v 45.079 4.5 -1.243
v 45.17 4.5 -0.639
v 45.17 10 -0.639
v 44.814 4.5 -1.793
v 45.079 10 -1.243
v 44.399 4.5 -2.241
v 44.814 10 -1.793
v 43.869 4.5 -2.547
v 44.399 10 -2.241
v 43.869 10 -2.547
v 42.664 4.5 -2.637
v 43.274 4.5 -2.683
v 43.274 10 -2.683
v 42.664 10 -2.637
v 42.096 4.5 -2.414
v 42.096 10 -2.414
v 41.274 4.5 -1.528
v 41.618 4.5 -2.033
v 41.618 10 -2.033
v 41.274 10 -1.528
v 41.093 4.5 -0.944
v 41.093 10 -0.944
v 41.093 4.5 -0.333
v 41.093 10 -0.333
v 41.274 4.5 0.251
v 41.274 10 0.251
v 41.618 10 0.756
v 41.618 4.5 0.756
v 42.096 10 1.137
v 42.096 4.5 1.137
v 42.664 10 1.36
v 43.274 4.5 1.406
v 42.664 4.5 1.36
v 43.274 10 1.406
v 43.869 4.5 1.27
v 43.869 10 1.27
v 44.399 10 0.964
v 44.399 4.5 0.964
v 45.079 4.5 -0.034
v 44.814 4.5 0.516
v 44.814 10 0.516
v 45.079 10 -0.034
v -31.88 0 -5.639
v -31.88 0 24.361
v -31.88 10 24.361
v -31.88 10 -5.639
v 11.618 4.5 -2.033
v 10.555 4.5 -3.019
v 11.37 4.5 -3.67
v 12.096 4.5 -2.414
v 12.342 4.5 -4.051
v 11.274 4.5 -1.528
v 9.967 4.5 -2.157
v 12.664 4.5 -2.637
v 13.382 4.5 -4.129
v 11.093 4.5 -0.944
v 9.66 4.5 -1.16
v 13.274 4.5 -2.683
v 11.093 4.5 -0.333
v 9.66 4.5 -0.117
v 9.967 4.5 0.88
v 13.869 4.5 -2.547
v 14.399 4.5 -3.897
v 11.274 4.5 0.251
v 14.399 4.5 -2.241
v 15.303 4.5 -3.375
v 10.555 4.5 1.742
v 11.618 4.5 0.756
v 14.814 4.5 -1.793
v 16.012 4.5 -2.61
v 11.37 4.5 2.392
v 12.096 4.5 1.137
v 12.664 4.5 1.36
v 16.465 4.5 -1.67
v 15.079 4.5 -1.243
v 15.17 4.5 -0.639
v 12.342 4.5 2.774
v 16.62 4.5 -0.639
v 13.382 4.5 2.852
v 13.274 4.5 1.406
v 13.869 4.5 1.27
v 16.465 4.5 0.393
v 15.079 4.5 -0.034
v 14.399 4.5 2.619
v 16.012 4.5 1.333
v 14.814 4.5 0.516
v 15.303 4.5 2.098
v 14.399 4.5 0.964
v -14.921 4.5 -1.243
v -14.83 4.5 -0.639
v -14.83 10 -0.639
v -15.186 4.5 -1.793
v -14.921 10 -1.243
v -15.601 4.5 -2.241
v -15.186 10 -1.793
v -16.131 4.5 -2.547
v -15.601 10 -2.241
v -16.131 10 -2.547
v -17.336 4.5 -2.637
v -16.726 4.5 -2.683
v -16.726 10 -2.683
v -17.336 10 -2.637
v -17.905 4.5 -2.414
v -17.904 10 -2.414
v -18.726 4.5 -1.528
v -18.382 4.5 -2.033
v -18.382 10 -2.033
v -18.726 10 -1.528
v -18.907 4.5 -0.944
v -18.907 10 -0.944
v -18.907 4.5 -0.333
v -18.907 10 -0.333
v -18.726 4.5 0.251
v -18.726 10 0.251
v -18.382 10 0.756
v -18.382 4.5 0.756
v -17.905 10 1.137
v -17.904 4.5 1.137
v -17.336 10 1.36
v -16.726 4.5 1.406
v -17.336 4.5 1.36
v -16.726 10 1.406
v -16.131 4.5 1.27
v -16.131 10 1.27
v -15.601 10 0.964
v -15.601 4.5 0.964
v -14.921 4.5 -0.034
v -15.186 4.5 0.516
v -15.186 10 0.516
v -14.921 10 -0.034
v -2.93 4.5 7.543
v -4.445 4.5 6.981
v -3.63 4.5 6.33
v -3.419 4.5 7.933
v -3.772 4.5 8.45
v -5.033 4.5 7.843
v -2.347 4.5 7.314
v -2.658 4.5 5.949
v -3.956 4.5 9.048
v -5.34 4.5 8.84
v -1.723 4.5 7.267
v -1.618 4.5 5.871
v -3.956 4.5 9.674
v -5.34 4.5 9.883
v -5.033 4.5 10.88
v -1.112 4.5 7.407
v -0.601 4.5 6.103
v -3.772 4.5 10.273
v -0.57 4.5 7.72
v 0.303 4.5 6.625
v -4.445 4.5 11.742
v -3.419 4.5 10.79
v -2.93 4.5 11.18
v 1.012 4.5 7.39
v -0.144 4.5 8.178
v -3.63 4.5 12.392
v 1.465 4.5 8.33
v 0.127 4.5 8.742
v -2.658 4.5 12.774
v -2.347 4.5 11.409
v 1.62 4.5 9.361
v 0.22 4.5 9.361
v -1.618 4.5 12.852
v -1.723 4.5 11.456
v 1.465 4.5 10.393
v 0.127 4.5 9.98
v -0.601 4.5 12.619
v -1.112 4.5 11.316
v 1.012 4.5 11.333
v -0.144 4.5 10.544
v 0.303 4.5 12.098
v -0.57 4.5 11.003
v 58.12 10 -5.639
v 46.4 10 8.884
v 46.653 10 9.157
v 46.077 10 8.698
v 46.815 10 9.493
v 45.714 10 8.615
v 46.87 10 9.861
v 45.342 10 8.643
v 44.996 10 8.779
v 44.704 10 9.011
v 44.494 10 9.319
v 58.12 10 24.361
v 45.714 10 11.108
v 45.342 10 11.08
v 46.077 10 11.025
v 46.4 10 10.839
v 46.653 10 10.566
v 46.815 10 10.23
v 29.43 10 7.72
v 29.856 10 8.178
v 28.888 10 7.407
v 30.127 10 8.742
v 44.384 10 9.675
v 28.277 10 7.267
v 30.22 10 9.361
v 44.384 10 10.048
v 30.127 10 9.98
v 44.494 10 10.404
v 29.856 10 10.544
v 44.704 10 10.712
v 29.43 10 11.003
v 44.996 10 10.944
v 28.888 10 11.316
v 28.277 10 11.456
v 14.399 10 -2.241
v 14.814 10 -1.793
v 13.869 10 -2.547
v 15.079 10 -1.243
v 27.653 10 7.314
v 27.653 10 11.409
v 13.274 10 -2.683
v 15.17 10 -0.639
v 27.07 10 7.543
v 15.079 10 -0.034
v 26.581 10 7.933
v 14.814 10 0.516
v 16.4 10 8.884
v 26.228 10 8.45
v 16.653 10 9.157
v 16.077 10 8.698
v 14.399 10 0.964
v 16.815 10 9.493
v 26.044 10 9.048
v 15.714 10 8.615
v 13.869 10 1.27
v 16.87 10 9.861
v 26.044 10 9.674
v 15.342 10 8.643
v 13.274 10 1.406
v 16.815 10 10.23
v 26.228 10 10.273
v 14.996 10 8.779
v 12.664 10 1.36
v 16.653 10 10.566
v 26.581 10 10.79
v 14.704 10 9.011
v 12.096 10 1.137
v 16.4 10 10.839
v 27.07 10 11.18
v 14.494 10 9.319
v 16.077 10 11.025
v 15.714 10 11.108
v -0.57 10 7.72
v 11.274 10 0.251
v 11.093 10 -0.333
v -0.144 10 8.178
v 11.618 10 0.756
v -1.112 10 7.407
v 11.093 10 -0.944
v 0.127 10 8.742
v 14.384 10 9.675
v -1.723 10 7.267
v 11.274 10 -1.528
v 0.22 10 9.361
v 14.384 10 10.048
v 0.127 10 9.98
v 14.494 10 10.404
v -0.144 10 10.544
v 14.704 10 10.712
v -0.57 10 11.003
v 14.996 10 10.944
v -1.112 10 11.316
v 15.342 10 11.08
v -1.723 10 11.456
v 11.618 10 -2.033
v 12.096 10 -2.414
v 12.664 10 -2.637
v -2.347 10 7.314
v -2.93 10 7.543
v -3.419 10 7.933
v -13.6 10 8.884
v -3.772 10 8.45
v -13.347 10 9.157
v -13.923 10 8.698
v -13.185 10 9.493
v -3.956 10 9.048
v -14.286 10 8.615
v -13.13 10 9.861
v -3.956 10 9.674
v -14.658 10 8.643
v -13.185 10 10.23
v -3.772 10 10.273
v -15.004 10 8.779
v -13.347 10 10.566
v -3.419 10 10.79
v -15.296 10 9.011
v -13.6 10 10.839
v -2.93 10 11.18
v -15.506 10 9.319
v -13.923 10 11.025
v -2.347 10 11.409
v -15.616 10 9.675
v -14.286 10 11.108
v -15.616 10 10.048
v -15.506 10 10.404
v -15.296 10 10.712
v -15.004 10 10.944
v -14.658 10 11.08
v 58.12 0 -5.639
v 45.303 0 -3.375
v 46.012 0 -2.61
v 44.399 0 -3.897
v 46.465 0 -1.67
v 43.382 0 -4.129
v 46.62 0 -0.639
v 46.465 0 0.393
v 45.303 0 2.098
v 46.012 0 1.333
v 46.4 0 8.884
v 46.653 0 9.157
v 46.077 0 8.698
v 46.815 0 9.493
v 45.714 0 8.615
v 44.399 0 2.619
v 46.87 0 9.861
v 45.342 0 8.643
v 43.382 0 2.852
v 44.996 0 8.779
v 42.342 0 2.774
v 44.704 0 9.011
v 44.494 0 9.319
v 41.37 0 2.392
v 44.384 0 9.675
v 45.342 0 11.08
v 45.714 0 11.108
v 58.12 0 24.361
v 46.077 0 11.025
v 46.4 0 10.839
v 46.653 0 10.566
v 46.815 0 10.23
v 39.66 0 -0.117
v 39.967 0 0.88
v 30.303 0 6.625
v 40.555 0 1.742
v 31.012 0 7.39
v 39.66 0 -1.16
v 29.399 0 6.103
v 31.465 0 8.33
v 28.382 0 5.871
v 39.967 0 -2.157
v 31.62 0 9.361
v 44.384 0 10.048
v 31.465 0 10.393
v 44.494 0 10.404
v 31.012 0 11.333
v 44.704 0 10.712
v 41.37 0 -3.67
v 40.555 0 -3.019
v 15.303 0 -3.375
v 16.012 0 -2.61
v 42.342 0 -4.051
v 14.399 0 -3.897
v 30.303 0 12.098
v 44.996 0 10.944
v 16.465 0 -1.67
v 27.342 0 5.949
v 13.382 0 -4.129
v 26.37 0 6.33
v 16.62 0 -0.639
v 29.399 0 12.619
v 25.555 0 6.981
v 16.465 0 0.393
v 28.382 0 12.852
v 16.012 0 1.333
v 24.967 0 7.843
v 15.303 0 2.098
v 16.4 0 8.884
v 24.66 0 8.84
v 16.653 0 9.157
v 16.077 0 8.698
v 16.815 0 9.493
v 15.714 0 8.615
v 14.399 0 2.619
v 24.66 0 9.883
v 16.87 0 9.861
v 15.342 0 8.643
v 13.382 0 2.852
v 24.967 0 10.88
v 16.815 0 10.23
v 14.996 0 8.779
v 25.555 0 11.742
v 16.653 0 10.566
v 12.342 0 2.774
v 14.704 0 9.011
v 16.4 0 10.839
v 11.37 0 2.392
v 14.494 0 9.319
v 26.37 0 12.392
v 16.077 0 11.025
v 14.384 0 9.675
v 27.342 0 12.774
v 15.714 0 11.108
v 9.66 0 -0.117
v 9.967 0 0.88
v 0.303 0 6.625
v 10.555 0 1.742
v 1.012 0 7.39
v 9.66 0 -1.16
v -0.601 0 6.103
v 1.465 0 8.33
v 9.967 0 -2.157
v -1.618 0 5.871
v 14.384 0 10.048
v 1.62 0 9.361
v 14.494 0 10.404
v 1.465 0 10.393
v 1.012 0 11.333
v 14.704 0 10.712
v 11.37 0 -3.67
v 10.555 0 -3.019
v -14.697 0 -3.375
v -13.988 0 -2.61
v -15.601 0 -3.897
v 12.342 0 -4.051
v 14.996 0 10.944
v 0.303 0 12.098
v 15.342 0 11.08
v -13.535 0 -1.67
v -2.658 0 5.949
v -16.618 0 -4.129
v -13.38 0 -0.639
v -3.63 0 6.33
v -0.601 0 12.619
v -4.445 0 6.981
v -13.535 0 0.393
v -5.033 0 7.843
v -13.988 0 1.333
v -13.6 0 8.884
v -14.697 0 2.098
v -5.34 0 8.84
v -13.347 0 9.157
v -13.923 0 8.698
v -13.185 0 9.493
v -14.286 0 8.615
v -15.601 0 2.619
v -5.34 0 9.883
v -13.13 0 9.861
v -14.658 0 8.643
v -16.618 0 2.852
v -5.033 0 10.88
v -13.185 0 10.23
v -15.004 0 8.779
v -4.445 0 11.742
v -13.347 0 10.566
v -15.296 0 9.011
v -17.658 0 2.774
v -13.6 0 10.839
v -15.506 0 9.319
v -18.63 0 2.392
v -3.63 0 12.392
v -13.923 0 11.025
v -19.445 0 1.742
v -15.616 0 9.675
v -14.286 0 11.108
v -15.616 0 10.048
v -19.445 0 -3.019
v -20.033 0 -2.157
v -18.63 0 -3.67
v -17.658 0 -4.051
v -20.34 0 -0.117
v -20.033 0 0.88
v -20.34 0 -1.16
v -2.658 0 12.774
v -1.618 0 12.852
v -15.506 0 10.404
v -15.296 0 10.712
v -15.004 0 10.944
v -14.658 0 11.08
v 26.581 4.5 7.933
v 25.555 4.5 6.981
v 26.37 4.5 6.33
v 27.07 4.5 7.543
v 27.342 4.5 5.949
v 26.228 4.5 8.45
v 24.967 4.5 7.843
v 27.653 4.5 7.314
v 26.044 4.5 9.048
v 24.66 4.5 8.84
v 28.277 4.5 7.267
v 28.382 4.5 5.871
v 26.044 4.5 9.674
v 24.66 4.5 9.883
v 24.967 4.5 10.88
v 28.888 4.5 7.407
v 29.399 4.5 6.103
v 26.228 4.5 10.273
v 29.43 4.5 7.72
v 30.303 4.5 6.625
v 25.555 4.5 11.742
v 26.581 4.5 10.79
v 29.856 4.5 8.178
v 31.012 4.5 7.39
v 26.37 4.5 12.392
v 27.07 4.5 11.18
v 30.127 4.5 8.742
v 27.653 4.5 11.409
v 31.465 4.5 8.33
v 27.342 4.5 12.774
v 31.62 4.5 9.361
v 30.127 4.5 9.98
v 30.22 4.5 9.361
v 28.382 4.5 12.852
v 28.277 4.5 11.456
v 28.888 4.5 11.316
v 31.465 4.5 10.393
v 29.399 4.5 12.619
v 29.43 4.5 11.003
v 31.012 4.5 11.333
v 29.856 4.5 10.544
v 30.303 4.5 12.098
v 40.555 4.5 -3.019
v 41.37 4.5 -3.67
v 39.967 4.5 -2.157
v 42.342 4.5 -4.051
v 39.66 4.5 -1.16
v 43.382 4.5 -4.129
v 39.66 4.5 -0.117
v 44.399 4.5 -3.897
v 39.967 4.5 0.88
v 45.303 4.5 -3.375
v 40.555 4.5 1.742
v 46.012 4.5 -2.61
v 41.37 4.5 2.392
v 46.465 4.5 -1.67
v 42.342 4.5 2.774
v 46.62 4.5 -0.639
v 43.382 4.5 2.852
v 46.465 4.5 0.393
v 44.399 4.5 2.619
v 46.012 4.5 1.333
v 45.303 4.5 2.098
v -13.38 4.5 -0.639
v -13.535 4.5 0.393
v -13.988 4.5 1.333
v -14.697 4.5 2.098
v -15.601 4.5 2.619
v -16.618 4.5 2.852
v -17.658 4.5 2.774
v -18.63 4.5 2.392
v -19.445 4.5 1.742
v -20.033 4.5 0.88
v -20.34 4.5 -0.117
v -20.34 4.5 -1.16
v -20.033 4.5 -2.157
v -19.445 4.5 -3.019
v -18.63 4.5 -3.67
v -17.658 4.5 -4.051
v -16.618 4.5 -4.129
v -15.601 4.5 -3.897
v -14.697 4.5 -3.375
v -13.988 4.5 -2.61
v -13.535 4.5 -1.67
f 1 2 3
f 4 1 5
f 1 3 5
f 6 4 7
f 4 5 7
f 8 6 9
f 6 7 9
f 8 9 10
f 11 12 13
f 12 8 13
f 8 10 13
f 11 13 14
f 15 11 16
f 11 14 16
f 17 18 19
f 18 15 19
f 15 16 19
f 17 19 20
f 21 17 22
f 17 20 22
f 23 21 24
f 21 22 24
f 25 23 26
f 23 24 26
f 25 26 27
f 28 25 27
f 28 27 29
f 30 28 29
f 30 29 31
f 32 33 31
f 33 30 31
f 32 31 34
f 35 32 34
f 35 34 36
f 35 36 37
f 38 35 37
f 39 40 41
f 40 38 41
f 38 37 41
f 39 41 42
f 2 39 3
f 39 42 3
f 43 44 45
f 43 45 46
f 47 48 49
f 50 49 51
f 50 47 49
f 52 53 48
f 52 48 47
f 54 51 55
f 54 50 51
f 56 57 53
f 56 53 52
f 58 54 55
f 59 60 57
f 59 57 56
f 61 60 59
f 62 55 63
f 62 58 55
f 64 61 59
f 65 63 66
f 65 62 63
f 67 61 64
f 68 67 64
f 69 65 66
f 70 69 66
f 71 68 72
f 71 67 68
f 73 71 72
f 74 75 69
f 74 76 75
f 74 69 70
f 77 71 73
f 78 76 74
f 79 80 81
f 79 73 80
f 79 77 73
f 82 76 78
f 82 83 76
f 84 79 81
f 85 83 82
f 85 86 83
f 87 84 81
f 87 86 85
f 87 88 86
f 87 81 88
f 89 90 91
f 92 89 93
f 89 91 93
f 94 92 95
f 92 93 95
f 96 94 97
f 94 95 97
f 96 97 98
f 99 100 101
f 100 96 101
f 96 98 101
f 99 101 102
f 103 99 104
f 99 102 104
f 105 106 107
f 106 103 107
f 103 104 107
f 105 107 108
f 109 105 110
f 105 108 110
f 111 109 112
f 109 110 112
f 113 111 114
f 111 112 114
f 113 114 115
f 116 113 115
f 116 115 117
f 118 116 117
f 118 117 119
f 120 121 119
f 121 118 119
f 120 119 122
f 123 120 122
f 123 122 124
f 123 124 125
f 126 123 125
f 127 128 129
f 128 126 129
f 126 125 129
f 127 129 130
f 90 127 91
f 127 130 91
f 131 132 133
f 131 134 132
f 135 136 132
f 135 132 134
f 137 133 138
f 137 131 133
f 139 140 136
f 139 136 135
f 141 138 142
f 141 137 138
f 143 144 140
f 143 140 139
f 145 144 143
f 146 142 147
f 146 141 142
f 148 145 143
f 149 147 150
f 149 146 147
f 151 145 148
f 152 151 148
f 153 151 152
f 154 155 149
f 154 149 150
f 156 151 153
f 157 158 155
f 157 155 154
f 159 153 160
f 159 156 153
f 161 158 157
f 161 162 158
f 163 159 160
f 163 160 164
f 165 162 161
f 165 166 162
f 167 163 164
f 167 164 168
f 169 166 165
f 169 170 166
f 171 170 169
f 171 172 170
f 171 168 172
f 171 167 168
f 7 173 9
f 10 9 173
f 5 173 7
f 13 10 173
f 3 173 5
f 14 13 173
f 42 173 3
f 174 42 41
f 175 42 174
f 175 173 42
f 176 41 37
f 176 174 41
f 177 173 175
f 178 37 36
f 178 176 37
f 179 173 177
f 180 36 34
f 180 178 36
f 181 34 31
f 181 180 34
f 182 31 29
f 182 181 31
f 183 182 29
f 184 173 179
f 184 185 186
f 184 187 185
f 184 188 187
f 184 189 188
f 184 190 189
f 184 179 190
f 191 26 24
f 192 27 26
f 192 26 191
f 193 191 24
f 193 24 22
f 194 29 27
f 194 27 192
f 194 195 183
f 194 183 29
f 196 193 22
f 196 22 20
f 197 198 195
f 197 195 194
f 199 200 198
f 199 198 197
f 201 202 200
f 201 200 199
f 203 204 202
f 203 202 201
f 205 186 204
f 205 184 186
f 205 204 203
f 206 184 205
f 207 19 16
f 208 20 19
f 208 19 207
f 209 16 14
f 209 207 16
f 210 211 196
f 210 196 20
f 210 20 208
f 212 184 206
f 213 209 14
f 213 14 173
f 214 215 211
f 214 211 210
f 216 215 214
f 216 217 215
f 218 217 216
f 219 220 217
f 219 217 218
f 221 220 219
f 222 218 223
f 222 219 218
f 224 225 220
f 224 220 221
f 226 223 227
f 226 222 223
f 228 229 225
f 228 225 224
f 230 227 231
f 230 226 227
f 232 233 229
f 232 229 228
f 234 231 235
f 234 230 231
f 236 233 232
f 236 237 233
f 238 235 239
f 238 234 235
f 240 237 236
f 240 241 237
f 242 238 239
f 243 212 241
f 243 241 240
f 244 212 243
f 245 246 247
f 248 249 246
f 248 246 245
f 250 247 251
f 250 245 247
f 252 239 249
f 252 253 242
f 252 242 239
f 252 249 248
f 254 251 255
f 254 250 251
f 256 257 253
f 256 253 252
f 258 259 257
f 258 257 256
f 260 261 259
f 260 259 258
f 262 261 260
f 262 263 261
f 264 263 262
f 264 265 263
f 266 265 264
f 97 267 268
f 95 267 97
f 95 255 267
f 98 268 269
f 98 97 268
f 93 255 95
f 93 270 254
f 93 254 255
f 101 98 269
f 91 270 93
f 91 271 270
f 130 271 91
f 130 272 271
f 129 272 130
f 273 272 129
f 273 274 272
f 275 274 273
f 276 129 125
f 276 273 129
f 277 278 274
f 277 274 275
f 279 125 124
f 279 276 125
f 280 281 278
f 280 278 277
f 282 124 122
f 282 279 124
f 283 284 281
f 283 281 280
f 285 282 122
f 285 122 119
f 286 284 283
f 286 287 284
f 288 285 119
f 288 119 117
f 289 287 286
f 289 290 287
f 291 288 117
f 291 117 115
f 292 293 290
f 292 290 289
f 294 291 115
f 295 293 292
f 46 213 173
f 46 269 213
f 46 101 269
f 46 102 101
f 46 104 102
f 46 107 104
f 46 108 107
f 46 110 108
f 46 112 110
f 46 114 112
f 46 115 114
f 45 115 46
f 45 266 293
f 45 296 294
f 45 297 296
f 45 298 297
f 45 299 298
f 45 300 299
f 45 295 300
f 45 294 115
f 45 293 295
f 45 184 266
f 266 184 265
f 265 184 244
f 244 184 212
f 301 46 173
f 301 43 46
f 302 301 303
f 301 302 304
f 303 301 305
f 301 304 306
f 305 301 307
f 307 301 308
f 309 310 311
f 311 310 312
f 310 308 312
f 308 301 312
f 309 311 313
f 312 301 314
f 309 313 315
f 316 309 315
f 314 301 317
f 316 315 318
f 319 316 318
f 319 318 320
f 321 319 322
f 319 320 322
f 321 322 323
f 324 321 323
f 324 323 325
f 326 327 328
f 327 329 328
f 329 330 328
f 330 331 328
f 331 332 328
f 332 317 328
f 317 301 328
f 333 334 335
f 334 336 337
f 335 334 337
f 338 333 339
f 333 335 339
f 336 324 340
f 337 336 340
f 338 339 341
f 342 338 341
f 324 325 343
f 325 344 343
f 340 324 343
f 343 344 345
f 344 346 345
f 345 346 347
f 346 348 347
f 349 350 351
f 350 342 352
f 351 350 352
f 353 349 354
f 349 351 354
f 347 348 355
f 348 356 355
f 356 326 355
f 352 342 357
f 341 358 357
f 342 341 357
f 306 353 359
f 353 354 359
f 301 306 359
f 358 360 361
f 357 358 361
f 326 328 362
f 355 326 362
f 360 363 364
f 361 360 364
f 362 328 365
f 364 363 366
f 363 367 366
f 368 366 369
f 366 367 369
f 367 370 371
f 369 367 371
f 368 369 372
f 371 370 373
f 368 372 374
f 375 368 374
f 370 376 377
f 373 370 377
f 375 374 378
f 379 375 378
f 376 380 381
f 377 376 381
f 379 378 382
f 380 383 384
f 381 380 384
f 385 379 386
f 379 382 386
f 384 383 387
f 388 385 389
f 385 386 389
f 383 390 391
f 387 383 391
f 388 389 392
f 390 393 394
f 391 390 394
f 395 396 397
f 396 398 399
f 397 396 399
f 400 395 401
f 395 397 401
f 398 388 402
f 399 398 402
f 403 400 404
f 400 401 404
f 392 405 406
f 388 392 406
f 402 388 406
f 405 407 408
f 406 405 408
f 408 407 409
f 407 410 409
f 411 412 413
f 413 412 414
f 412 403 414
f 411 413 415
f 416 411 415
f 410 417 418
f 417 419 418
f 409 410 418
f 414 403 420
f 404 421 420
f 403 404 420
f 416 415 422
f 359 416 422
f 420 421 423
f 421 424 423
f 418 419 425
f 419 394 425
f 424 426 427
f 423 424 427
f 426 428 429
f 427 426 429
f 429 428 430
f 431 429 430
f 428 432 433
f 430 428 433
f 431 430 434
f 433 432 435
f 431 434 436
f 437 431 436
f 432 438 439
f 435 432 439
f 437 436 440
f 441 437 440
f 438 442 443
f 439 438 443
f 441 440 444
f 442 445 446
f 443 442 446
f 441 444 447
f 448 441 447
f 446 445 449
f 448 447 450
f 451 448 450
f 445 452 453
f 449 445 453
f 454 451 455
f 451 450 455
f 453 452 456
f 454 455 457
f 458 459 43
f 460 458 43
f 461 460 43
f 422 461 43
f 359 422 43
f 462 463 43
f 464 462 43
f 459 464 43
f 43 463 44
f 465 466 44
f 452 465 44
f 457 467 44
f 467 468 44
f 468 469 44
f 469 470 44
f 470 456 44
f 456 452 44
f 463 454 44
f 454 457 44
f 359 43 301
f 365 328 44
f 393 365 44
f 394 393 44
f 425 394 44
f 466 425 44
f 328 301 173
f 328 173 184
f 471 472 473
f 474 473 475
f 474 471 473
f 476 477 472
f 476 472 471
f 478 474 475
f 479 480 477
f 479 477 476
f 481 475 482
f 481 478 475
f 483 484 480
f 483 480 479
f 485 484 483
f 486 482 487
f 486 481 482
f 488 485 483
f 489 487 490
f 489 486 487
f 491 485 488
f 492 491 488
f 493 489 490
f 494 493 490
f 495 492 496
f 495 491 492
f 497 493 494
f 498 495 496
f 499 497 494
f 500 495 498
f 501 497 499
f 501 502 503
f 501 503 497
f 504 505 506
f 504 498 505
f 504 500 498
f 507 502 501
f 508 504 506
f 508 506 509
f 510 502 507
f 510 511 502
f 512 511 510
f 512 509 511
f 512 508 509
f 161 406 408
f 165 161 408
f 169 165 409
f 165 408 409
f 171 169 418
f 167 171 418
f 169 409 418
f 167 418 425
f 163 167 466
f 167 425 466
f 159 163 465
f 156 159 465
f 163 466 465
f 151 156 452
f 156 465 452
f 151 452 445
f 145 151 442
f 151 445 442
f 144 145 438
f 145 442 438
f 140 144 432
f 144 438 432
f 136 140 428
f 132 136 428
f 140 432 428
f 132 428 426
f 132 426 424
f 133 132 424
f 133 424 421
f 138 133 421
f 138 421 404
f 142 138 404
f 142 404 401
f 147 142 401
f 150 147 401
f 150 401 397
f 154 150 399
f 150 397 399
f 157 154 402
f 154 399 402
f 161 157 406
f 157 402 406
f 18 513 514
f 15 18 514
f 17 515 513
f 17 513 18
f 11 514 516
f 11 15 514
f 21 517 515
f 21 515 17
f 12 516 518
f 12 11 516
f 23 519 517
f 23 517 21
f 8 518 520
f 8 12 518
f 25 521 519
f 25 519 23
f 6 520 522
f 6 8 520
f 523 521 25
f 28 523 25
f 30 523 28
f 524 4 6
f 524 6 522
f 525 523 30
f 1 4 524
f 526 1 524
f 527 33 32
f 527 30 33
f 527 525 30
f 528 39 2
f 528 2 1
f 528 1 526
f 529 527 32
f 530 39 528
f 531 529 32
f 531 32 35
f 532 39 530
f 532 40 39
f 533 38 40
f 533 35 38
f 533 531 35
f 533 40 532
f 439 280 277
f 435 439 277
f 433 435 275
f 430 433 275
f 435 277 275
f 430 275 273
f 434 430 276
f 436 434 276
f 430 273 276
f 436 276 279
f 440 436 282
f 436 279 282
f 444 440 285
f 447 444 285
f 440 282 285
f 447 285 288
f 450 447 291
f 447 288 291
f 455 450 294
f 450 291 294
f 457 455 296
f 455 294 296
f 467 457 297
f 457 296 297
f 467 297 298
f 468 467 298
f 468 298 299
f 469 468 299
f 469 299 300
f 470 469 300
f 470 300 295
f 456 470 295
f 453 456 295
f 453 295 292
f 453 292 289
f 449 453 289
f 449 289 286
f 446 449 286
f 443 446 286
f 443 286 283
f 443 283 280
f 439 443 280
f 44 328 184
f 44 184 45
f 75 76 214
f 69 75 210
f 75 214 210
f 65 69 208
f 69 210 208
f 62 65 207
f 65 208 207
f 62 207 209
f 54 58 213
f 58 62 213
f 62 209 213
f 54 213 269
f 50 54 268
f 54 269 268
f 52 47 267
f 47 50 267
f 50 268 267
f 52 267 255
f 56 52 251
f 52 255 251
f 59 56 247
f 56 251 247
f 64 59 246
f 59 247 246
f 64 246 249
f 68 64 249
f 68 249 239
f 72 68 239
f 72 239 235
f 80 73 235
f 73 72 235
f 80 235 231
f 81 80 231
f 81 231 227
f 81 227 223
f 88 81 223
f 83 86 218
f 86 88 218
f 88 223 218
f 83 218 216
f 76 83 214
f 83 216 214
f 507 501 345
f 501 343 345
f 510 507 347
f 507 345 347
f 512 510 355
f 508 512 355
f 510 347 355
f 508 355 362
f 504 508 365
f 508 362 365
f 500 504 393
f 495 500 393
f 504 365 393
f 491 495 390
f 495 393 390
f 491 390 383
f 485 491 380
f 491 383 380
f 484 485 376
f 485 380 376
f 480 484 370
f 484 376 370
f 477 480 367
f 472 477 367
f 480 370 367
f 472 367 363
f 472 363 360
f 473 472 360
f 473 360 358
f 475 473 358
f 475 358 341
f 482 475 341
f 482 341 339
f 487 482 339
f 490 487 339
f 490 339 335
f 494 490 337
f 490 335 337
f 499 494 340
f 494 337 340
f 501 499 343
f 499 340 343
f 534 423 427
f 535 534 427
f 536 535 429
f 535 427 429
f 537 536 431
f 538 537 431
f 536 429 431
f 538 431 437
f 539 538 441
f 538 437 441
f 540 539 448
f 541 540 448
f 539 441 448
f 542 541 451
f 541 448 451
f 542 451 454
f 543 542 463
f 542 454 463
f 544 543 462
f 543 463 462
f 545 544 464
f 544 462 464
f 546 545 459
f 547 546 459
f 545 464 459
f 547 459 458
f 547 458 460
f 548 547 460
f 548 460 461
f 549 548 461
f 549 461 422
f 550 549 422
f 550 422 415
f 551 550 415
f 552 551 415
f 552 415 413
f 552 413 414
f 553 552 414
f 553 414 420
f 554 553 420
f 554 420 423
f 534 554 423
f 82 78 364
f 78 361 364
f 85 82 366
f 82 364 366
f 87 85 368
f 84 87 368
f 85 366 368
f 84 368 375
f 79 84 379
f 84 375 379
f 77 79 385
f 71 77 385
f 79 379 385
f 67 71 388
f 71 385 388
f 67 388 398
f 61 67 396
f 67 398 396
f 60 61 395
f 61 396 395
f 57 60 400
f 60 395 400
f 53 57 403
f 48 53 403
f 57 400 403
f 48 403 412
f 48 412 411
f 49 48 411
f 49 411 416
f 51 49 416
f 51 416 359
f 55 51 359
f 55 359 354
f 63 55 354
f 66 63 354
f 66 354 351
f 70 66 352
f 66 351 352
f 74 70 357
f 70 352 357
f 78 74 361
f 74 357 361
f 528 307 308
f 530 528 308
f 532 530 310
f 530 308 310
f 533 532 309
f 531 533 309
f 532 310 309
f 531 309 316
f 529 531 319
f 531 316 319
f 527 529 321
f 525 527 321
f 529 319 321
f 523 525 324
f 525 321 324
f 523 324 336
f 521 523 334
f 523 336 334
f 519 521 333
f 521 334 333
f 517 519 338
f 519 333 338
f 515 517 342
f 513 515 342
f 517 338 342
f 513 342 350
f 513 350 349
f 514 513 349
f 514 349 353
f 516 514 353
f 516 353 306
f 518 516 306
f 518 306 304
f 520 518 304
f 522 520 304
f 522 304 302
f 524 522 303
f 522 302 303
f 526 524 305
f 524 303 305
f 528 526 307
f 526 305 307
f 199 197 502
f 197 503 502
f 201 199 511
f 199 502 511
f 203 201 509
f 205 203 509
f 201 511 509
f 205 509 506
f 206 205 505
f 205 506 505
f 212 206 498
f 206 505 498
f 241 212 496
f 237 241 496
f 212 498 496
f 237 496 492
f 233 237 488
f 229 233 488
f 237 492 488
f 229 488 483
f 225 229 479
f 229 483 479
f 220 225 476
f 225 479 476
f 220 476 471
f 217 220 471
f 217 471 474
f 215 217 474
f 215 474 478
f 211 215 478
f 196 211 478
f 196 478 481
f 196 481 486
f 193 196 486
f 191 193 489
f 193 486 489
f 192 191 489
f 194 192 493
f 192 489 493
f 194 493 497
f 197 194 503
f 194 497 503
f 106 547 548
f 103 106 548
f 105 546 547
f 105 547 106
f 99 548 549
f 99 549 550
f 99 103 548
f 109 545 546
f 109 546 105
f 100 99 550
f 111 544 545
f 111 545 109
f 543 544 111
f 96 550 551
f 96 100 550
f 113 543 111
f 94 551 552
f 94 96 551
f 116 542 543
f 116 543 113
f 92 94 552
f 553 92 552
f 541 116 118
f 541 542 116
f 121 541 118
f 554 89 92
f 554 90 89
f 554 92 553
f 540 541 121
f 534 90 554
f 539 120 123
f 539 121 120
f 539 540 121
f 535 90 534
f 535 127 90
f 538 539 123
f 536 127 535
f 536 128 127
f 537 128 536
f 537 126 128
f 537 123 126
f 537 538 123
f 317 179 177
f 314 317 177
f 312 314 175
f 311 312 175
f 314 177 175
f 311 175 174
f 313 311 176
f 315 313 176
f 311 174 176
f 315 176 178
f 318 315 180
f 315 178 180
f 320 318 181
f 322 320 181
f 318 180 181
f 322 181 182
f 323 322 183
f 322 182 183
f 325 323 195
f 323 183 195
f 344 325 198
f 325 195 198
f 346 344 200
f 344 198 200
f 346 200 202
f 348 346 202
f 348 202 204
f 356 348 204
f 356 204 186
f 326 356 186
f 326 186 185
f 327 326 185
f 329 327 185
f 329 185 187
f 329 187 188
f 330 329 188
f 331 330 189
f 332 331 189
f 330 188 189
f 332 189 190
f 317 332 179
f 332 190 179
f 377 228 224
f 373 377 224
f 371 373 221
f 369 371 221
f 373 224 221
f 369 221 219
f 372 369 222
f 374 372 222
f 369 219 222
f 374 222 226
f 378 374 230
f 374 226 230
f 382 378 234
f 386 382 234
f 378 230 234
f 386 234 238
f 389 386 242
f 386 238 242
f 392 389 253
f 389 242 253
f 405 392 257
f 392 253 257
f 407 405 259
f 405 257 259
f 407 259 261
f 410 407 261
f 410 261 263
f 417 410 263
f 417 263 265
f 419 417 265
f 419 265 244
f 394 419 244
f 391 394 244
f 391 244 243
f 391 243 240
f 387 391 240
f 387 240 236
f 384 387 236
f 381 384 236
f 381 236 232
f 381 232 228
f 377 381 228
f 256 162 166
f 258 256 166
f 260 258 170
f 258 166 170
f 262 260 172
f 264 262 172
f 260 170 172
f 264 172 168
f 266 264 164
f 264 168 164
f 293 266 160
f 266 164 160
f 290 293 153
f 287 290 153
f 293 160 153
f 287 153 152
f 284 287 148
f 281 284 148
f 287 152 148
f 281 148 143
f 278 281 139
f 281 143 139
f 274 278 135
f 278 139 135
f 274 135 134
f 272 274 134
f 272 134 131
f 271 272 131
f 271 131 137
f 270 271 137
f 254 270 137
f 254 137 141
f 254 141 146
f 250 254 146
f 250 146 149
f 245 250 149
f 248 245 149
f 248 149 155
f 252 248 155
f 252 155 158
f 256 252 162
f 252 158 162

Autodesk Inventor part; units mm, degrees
ref_plane "YZ Plane" through (0, 0, 0) normal (1, 0, 0) x (0, 1, 0)
ref_plane "XZ Plane" through (0, 0, 0) normal (0, 1, 0) x (-1, 0, 0)
ref_plane "XY Plane" through (0, 0, 0) normal (0, 0, 1) x (1, 0, 0)
sketch "Sketch1" plane through (0, 0, 0) normal (0, 1, 0) x (-1, 0, 0)
  line L0 (31.8795, -5.6386) -> (-58.1205, -5.6386)
  line L1 (-58.1205, -5.6386) -> (-58.1205, 24.3614)
  line L2 (-58.1205, 24.3614) -> (31.8795, 24.3614)
  line L3 (31.8795, 24.3614) -> (31.8795, -5.6386)
  point P0 (0, 0)
  dimension "d0" = 90
  dimension "d5" = 30
extrude "Extrusion1" add sketch "Sketch1" along normal blind 10
sketch "Sketch2" plane through (0, 10, 0) normal (0, 1, 0) x (1, 0, 0)
  line L0 (58.1205, 5.6386) -> (-31.8795, 5.6386) projected
  line L1 (-31.8795, 5.6386) -> (-31.8795, -24.3614) projected
  circle A0 centre (-16.8795, 0.6386) radius 2.05
  circle A1 centre (13.1205, 0.6386) radius 2.05
  circle A2 centre (43.1205, 0.6386) radius 2.05
  point P0 (0, 0)
  dimension "d8" = 4.1
  dimension "d10" = 4.1
  dimension "d11" = 4.1
  dimension "d12" = 5
  dimension "d13" = 5
  dimension "d14" = 5
  dimension "d15" = 15
  dimension "d16" = 30
  dimension "d17" = 30
extrude "Extrusion2" cut sketch "Sketch2" against normal blind 10
sketch "Sketch4" plane through (0, 0, 0) normal (0, -1, 0) x (1, 0, 0)
  circle A0 centre (13.1205, -0.6386) radius 2.05 projected
  circle A1 centre (-16.8795, -0.6386) radius 2.05 projected
  circle A2 centre (43.1205, -0.6386) radius 2.05 projected
  circle A3 centre (-16.8795, -0.6386) radius 3.5
  circle A4 centre (13.1205, -0.6386) radius 3.5
  circle A5 centre (43.1205, -0.6386) radius 3.5
  point P0 (0, 0)
  dimension "d26" = 7
  dimension "d28" = 7
  dimension "d29" = 7
extrude "Extrusion4" cut sketch "Sketch4" against normal blind 4.5
sketch "Sketch5" plane through (0, 0, 0) normal (0, -1, 0) x (1, 0, 0)
  line L0 (58.1205, -5.6386) -> (58.1205, 24.3614) projected
  line L1 (58.1205, 24.3614) -> (-31.8795, 24.3614) projected
  line L2 (-31.8795, 24.3614) -> (-31.8795, -5.6386) projected
  circle A0 centre (-1.8795, 9.3614) radius 2.1
  circle A1 centre (28.1205, 9.3614) radius 2.1
  point P0 (0, 0)
  dimension "d32" = 4.2
  dimension "d34" = 4.2
  dimension "d35" = 30
  dimension "d36" = 30
  dimension "d37" = 15
  dimension "d38" = 15
extrude "Extrusion5" cut sketch "Sketch5" against normal blind 10
sketch "Sketch6" plane through (0, 0, 0) normal (0, -1, 0) x (1, 0, 0)
  circle A0 centre (-1.8795, 9.3614) radius 2.1 projected
  circle A1 centre (28.1205, 9.3614) radius 2.1 projected
  circle A2 centre (-1.8795, 9.3614) radius 3.5
  circle A3 centre (28.1205, 9.3614) radius 3.5
  point P0 (0, 0)
  dimension "d41" = 7
  dimension "d43" = 7
extrude "Extrusion6" cut sketch "Sketch6" against normal blind 4.5
sketch "Sketch7" plane through (0, 10, 0) normal (0, 1, 0) x (1, 0, 0)
  line L0 (-31.8795, -24.3614) -> (58.1205, -24.3614) projected
  line L1 (58.1205, -24.3614) -> (58.1205, 5.6386) projected
  circle A0 centre (45.6205, -9.8614) radius 1.25
  circle A1 centre (15.6205, -9.8614) radius 1.25
  circle A2 centre (-14.3795, -9.8614) radius 1.25
  point P0 (0, 0)
  dimension "d46" = 2.5
  dimension "d48" = 2.5
  dimension "d49" = 2.5
  dimension "d50" = 12.5
  dimension "d51" = 14.5
  dimension "d52" = 30
  dimension "d53" = 30
  dimension "d54" = 14.5
  dimension "d55" = 14.5
extrude "Extrusion7" cut sketch "Sketch7" against normal blind 20
equation "\"d10\" = d8"
equation "\"d11\" = d8"
equation "\"d13\" = d12"
equation "\"d14\" = d12"
equation "\"d28\" = d26"
equation "\"d29\" = d26"
properties part number "AgarMouldBottomV3"
